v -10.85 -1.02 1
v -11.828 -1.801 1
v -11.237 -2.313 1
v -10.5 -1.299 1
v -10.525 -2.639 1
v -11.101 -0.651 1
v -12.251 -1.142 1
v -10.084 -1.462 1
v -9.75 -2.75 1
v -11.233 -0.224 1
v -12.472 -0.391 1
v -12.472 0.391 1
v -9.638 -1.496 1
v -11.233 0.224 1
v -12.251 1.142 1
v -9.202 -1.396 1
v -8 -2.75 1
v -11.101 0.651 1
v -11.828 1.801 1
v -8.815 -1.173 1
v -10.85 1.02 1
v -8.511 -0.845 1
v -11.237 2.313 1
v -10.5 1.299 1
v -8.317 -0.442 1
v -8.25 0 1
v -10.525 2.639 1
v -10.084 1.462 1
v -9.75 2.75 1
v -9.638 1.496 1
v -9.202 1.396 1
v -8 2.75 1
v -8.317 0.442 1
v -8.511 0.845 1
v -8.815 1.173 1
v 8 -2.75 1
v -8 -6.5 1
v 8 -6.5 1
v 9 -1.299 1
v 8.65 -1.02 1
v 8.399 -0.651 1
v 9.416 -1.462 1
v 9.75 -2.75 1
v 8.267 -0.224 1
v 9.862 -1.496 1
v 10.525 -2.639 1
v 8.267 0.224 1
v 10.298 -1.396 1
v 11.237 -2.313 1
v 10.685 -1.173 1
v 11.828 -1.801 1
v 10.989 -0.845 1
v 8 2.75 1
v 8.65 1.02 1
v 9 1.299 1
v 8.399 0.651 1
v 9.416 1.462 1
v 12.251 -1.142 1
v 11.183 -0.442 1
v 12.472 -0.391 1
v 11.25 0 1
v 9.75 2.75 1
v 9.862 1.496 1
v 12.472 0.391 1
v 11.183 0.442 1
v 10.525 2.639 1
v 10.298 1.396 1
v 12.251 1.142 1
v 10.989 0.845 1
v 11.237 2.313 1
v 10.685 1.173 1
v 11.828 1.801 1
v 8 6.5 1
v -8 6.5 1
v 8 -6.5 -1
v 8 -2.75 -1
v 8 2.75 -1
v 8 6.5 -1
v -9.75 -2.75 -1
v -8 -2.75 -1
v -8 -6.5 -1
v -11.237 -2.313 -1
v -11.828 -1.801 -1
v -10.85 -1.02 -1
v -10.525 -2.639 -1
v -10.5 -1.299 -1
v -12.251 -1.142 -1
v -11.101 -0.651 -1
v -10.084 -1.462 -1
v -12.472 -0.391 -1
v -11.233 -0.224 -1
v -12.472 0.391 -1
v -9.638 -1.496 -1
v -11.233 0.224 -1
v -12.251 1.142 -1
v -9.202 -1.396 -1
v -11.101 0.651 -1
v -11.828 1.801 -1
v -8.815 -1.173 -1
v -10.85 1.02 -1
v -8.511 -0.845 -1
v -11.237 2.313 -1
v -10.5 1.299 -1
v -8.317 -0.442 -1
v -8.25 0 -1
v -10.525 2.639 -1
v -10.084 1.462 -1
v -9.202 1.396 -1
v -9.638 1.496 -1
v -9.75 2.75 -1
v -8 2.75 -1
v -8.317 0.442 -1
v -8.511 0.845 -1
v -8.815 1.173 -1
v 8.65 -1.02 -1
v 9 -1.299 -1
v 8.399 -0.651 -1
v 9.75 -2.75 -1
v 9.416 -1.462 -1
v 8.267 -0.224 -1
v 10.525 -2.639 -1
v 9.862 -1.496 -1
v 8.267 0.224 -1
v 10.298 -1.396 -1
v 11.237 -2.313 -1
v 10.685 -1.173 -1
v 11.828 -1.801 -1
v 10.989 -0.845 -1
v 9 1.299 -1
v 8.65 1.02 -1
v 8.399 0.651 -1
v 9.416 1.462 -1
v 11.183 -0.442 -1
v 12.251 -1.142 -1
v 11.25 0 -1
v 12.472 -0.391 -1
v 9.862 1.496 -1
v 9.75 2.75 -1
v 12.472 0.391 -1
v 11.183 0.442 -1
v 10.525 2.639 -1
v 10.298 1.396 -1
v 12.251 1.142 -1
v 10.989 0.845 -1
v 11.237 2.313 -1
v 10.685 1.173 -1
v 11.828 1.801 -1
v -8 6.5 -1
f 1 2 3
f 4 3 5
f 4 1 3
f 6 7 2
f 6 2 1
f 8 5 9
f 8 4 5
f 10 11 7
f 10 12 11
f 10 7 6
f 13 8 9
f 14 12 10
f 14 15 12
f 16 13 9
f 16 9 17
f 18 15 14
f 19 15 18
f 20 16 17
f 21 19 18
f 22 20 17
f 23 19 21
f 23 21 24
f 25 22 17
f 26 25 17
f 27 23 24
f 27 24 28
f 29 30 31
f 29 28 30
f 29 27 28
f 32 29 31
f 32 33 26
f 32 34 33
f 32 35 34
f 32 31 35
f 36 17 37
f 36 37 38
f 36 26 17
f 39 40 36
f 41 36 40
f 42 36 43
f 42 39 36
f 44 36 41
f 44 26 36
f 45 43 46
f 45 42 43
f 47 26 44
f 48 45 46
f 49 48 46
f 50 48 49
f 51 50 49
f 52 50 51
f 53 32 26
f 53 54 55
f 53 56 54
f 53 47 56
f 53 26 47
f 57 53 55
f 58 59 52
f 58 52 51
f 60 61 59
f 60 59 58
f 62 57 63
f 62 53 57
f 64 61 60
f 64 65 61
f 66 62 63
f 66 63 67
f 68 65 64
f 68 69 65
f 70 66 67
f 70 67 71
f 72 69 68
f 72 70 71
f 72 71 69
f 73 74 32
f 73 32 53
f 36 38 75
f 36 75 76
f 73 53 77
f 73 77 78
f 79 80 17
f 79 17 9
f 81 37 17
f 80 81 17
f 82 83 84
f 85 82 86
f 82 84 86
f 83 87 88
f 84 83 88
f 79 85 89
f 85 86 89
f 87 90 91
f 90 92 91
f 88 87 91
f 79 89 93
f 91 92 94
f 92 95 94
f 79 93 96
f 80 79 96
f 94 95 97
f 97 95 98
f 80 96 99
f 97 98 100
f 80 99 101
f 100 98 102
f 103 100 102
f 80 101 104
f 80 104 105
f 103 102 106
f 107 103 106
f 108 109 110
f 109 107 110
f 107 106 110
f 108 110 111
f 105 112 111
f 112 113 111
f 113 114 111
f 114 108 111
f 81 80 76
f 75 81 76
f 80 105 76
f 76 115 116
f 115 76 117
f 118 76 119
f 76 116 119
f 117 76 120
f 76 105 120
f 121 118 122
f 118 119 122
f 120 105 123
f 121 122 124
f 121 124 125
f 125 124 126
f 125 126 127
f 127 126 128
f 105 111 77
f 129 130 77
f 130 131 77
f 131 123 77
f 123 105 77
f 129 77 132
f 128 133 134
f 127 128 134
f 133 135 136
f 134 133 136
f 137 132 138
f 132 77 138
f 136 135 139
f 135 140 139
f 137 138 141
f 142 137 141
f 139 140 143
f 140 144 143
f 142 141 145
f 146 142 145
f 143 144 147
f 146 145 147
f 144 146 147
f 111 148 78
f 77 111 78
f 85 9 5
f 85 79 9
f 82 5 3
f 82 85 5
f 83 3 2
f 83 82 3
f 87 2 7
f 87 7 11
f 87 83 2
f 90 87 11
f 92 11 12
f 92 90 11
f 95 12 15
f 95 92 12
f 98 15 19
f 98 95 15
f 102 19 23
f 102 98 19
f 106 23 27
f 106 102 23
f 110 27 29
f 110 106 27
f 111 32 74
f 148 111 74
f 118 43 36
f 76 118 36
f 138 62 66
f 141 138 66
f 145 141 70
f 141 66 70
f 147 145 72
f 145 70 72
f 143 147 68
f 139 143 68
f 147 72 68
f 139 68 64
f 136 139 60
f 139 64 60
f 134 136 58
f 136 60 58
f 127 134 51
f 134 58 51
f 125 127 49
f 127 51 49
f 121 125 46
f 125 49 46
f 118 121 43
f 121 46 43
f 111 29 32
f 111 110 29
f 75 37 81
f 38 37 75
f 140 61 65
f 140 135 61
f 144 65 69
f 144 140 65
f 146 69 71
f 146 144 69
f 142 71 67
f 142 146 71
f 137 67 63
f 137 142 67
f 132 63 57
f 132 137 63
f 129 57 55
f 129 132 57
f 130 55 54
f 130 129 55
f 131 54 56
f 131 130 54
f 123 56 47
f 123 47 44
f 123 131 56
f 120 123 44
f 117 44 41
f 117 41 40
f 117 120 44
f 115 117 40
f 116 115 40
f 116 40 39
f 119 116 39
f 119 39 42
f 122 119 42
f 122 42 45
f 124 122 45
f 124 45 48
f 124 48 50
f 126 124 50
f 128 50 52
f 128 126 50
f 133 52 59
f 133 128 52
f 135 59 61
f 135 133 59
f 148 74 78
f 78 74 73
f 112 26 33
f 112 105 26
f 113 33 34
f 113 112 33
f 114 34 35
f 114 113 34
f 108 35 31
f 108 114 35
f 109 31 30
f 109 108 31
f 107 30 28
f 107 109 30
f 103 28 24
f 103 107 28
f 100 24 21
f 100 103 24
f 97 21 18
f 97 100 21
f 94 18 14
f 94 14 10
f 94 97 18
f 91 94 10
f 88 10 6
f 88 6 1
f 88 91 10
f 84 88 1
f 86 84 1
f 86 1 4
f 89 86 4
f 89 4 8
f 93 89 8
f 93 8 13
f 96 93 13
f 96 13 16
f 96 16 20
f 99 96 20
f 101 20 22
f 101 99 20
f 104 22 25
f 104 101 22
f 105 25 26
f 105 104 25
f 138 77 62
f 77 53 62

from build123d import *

# Parameters (mm, degrees)
SKETCH1_W           = 16
SKETCH1_H           = 13
BOSS_EXTRUDE1_DEPTH = 1
SKETCH2_R           = 1.5
BOSS_EXTRUDE2_DEPTH = 1


with BuildPart() as part:
    # Sketch1 → Boss-Extrude1 (new body, symmetric)
    with BuildSketch(Plane.XY):
        Rectangle(SKETCH1_W, SKETCH1_H)
    extrude(amount=BOSS_EXTRUDE1_DEPTH, both=True)

    # Sketch2 → Boss-Extrude2 (add, symmetric)
    with BuildSketch(Plane.XY):
        with BuildLine():
            Line((-9.75, 2.75), (-8, 2.75))
            Line((-8, 2.75), (-8, -2.75))
            Line((-8, -2.75), (-9.75, -2.75))
            ThreePointArc((-9.75, -2.75), (-12.5, 0), (-9.75, 2.75))
        make_face()
        with Locations((-9.75, 0)):
            Circle(SKETCH2_R, mode=Mode.SUBTRACT)
        with BuildLine():
            Line((9.75, -2.75), (8, -2.75))
            Line((8, -2.75), (8, 2.75))
            Line((8, 2.75), (9.75, 2.75))
            ThreePointArc((9.75, 2.75), (12.5, 0), (9.75, -2.75))
        make_face()
        with Locations((9.75, 0)):
            Circle(SKETCH2_R, mode=Mode.SUBTRACT)
    extrude(amount=BOSS_EXTRUDE2_DEPTH, both=True)


solid = part.part
